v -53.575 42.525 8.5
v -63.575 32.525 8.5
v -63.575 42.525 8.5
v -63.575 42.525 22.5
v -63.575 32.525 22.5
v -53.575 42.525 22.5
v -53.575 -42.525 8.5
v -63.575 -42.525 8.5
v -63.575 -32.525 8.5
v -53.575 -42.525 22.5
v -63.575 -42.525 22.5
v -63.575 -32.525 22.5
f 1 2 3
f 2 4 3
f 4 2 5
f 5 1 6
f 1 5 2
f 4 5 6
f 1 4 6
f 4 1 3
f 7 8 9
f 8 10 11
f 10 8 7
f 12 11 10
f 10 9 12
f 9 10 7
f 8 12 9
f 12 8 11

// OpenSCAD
// Generated by SolidPython 1.1.3 on 2024-01-02 17:03:51


union() {
	translate(v = [-63.5750000000, 42.5250000000, 8.5000000000]) {
		translate(v = [0, -10, 0]) {
			linear_extrude(height = 14) {
				polygon(points = [[0, 0], [0, 10], [0, 10], [0, 10], [10, 10], [10, 10]]);
			}
		}
	}
	translate(v = [-63.5750000000, -42.5250000000, 8.5000000000]) {
		translate(v = [10, 0, 0]) {
			rotate(a = 90) {
				linear_extrude(height = 14) {
					polygon(points = [[0, 0], [0, 10], [0, 10], [0, 10], [10, 10], [10, 10]]);
				}
			}
		}
	}
}
/***********************************************
*********      SolidPython code:      **********
************************************************
 
import solid
from make_device import make_unit_array
import os.path as osp

version="v1"
base_path="./designs/plasma_racks/4mm_well_0.5inch_diam_device_"+version+"/"
base_name="12_well_plate_"+version
#basic plate dims
plate_size_outer=[127.5,85.35]
plate_size_inner=[127.15,85.05]
plate_height=22.5
plate_height_inner=14
corner_x=10
corner_y=10
grid_size=[4,3]
dims = [26,26,0]
well_diam=22.9



def save_model(model,base_path,base_name):
    if not osp.exists(base_path):
        os.makedirs(base_path)
    scad_path=osp.join(base_path,base_name+".scad")
    solid.scad_render_to_file(model,osp.join(scad_path))

def center_unit_array(model,dims,grid_size):
    model = solid.translate([dims[0]/2.0,dims[1]/2.0,0])(model)
    model = solid.translate([-dims[0]*(grid_size[0]/2.0),
                             -dims[1]*(grid_size[1]/2.0),0])(model)
    return model


#plate_chassis
plate_height_diff=plate_height-plate_height_inner

plate=solid.cube((*plate_size_outer,plate_height_diff),center=True)
plate=solid.translate([0,0,plate_height_diff/2.0])(plate)

plate_inner=solid.cube((*plate_size_inner,plate_height_inner),center=True)
plate_inner=solid.translate([0,0,plate_height_inner/2.0+plate_height_diff])(plate_inner)
plate=solid.union()(plate,plate_inner)

#corners
#               0       1        2        3         4          5
corner_points=[[0,0,0],[0,corner_y,10],[0,corner_y,0],[0,corner_y,10],[corner_x,corner_y,10],[corner_x,corner_y,0]]
corner=solid.polygon(points=corner_points)()
corner=solid.linear_extrude(height=plate_height_inner)(corner)

corner_top_left=corner
#corner_top_left=solid.translate([-corner_x/2.0,-corner_y/2.0,0])(corner_top_left)
corner_top_left=solid.translate([0,-corner_y,0])(corner_top_left)
corner_top_left=solid.translate([-plate_size_inner[0]/2.0,plate_size_inner[1]/2.0,plate_height_diff])(corner_top_left)

corner_bottom_left=solid.rotate(90)(corner)
corner_bottom_left=solid.translate([corner_x,0,0])(corner_bottom_left)
corner_bottom_left=solid.translate([-plate_size_inner[0]/2.0,-plate_size_inner[1]/2.0,plate_height_diff])(corner_bottom_left)

corners = solid.union()(corner_top_left,corner_bottom_left)
plate=solid.difference()(plate,corners)
save_model(corners,base_path,"corner_test")

well = solid.cylinder(r=well_diam/2.0, h=plate_height, segments=64, center = True)
well = solid.translate([0,0,plate_height/2.0])(well)
wells=make_unit_array(well,dims,grid_size)
wells=center_unit_array(wells,dims,grid_size)
plate = solid.difference()(plate,wells)
save_model(plate,base_path,base_name)
 
 
************************************************/
